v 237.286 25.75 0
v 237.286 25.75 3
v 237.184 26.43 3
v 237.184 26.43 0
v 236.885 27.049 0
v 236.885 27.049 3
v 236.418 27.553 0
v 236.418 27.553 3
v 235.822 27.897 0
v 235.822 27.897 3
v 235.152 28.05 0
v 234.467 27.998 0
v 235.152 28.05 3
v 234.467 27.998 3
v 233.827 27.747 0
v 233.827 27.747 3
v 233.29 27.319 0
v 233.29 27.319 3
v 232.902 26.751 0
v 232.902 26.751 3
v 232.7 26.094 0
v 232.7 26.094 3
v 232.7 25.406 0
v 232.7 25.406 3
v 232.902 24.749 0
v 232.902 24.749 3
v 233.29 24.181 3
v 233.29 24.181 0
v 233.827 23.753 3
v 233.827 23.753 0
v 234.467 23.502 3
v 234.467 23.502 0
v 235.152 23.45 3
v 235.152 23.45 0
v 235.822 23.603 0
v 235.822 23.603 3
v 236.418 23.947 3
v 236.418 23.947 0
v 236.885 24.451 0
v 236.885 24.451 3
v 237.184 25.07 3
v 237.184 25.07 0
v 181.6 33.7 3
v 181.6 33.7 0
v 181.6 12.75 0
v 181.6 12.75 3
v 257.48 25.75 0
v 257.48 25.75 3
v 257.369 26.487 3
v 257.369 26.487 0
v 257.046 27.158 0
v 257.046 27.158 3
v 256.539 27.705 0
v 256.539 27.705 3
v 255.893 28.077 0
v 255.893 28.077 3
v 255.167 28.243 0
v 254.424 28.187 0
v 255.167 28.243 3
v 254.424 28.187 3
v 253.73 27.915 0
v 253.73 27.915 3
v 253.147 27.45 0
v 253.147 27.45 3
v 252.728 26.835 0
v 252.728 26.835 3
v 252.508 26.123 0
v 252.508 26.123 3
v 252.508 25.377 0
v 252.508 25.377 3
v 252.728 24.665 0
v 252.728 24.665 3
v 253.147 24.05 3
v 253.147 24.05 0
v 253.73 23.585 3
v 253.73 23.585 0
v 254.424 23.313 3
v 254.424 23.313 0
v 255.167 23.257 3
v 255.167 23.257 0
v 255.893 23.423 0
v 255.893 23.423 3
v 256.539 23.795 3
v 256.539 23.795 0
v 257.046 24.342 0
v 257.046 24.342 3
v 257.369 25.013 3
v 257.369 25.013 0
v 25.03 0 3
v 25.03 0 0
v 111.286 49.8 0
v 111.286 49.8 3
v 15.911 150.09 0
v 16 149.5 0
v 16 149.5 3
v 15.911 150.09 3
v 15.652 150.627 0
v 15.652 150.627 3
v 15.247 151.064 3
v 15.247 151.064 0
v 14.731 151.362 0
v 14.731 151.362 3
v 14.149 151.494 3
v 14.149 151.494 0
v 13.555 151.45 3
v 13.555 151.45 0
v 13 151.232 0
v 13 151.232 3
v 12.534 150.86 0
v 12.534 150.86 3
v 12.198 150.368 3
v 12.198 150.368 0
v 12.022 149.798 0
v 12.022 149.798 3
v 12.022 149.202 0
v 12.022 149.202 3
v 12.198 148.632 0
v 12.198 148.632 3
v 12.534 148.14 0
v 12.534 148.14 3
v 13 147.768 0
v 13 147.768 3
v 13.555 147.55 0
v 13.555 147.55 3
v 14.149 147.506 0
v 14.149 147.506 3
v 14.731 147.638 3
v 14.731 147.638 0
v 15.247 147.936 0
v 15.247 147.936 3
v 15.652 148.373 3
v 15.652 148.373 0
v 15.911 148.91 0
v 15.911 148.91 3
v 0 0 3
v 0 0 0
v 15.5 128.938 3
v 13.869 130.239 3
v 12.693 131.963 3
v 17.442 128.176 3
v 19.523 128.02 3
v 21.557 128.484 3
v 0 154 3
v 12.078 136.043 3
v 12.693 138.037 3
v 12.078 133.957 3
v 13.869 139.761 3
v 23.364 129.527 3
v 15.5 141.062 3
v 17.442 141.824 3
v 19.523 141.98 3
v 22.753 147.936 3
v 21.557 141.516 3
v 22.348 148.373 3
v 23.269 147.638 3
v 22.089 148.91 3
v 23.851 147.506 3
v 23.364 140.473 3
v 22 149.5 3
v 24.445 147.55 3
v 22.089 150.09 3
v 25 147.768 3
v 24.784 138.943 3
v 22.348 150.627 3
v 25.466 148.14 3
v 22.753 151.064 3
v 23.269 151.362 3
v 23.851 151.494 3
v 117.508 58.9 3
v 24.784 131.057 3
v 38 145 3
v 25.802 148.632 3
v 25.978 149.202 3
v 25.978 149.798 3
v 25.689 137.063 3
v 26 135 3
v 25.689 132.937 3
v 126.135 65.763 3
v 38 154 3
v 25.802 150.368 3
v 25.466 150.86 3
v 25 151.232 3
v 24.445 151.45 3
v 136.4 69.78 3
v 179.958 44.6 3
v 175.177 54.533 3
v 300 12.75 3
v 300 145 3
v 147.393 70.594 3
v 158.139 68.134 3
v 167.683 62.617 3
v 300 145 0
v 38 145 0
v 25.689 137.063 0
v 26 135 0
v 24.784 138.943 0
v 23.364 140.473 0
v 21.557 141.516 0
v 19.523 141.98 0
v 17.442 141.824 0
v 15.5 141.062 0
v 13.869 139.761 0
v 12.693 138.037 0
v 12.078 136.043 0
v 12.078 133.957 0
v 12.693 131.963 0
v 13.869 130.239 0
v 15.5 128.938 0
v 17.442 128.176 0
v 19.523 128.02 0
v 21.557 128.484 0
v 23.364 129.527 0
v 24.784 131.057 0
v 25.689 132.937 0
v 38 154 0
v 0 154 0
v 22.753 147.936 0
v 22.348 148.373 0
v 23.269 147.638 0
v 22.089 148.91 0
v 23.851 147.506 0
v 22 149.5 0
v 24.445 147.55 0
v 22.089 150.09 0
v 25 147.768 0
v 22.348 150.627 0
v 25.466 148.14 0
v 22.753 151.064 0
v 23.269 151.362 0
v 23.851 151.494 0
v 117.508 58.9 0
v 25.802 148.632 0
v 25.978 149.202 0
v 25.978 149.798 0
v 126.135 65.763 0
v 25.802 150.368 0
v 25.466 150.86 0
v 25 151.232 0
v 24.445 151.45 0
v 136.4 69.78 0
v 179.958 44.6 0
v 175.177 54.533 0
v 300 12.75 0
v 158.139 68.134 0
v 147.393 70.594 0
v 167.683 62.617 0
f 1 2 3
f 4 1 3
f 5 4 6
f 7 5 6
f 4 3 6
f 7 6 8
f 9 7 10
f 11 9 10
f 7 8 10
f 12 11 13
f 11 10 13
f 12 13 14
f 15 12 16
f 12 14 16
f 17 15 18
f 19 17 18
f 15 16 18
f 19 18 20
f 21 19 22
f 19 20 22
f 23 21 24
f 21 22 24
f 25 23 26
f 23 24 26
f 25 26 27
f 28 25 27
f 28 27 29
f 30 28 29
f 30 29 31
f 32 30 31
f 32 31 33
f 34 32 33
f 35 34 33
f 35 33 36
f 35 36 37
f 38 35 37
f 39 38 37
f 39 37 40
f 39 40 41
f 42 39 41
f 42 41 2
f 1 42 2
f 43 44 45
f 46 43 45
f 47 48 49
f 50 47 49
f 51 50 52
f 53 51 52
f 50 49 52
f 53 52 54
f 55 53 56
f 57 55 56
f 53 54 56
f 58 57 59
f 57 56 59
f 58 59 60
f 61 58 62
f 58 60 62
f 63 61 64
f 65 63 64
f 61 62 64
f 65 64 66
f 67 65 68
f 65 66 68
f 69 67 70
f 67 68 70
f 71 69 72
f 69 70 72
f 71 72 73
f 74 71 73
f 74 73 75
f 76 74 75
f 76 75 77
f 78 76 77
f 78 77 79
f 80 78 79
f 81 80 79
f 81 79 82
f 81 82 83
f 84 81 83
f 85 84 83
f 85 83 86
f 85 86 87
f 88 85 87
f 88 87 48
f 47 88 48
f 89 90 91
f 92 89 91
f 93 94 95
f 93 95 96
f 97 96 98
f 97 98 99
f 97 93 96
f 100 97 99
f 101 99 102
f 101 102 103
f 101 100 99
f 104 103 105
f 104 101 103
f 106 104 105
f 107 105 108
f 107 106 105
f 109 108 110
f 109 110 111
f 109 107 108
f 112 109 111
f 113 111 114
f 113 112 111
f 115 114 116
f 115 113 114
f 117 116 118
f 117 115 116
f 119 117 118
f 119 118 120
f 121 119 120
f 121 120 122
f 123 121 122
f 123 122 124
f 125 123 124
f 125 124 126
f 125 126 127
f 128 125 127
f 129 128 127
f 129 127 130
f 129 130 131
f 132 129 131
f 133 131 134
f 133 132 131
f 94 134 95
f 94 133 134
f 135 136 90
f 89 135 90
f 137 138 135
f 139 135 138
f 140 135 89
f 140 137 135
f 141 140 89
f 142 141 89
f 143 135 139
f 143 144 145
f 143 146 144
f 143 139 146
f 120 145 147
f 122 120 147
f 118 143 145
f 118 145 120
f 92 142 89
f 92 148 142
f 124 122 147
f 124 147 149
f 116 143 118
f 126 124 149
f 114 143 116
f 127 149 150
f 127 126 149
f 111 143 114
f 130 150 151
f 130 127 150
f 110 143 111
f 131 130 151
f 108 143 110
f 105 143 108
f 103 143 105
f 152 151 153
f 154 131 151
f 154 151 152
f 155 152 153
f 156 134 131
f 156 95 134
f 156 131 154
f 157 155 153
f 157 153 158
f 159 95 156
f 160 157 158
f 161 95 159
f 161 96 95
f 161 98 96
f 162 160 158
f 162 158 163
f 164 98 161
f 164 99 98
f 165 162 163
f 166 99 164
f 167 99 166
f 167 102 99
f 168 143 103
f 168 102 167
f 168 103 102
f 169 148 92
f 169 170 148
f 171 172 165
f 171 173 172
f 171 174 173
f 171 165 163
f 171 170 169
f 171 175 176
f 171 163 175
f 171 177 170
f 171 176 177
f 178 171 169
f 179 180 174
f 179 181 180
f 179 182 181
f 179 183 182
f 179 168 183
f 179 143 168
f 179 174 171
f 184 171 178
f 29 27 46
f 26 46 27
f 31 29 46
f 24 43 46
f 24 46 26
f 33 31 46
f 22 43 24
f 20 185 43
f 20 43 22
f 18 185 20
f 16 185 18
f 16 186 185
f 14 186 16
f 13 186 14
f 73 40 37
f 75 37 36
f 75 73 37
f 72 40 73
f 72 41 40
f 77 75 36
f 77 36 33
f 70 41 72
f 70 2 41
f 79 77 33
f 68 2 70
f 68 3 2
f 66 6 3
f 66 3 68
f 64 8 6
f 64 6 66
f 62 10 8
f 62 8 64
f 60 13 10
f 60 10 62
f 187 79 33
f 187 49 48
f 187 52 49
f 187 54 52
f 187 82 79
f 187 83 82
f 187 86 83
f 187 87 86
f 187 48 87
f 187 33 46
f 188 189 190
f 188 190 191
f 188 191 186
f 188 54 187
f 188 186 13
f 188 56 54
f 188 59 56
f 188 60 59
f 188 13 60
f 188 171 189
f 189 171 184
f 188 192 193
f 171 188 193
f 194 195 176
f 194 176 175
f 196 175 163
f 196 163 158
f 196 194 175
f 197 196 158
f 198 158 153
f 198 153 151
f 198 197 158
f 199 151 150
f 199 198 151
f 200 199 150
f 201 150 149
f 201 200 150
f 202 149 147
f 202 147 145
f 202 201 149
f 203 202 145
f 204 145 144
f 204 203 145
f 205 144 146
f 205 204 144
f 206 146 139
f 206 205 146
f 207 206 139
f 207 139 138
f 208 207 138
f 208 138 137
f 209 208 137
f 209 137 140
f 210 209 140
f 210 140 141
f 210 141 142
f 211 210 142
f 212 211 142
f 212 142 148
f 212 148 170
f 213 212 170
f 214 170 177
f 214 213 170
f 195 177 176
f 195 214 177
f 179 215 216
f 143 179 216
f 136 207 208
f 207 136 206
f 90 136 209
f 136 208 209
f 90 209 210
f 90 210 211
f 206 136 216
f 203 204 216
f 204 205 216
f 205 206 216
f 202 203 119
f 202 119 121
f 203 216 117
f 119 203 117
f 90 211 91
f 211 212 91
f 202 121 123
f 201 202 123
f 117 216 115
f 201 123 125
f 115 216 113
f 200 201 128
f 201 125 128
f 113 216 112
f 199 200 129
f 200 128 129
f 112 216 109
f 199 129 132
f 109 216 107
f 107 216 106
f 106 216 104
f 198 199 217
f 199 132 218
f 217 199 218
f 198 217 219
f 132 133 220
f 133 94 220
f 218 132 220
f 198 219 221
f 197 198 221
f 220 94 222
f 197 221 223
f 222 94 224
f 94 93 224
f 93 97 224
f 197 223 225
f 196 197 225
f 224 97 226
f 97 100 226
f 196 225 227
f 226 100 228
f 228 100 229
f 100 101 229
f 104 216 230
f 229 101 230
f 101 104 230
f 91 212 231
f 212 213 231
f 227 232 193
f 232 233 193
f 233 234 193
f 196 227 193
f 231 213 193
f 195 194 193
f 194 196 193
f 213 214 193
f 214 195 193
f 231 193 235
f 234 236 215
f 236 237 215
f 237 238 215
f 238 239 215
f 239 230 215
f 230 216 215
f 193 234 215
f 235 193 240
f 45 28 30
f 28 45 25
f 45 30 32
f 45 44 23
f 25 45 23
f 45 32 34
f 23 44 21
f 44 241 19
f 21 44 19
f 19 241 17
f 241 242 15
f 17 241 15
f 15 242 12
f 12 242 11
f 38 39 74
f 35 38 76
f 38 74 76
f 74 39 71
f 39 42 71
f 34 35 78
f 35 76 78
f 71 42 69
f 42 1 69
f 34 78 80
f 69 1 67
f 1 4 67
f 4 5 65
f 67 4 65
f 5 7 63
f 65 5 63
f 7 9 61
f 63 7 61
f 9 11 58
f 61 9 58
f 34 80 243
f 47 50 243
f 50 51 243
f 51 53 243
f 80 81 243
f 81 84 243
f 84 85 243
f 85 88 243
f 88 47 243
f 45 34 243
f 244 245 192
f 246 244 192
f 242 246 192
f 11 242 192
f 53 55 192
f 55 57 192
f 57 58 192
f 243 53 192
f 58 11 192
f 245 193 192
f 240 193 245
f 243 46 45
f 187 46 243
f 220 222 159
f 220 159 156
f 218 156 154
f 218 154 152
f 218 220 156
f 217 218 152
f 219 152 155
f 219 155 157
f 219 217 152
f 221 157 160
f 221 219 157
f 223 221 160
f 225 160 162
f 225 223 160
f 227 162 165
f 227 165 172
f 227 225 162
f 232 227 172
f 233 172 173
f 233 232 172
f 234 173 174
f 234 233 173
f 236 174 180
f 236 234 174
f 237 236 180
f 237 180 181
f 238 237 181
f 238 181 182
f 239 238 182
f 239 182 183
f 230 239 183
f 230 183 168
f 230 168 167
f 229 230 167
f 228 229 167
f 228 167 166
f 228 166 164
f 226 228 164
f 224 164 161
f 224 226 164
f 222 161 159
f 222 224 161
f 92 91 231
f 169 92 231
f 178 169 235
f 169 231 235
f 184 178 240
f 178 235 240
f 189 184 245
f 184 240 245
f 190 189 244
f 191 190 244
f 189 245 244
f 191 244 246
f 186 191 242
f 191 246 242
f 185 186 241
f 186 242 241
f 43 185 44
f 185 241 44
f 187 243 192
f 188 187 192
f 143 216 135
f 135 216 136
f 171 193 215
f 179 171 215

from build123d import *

# Parameters (mm, degrees)
SKETCH2_R           = 7
SKETCH2_R_2         = 2
BOSS_EXTRUDE2_DEPTH = 3
SKETCH3_W           = 118.4
SKETCH3_H           = 12.75
CUT_EXTRUDE1_DEPTH  = 338.231374578
SKETCH5_R           = 2.5
SKETCH5_R_2         = 2.306063735
CUT_EXTRUDE2_DEPTH  = 338.231374578


with BuildPart() as part:
    # Sketch2 → Boss-Extrude2 (new body)
    with BuildSketch(Plane.XY):
        with BuildLine():
            Line((25.03035901, 0), (111.286489227, 49.8))
            ThreePointArc((111.286489227, 49.8), (152.858332199, 69.766604349), (181.6, 33.7))
            Line((181.6, 33.7), (181.6, 0))
            Line((181.6, 0), (300, 0))
            Line((300, 0), (300, 145))
            Line((300, 145), (38, 145))
            Line((38, 145), (38, 154))
            Line((38, 154), (19, 154))
            Line((19, 154), (0, 154))
            Line((0, 154), (0, 0))
            Line((0, 0), (25.03035901, 0))
        make_face()
        with Locations((19, 135)):
            Circle(SKETCH2_R, mode=Mode.SUBTRACT)
        with Locations((14, 149.5)):
            Circle(SKETCH2_R_2, mode=Mode.SUBTRACT)
        with Locations(Location((24, 149.5, 0), (0, 0, 180))):
            Circle(SKETCH2_R_2, mode=Mode.SUBTRACT)
    extrude(amount=BOSS_EXTRUDE2_DEPTH)

    # Sketch3 → Cut-Extrude1 (cut, through all)
    with BuildSketch(Plane.XY.offset(3)):
        with Locations((240.8, 6.375)):
            Rectangle(SKETCH3_W, SKETCH3_H)
    extrude(amount=-CUT_EXTRUDE1_DEPTH, mode=Mode.SUBTRACT)

    # Sketch5 → Cut-Extrude2 (cut, through all)
    with BuildSketch(Plane.XY.offset(3)):
        with Locations((254.98, 25.75)):
            Circle(SKETCH5_R)
        with Locations((234.98, 25.75)):
            Circle(SKETCH5_R_2)
    extrude(amount=-CUT_EXTRUDE2_DEPTH, mode=Mode.SUBTRACT)


solid = part.part
